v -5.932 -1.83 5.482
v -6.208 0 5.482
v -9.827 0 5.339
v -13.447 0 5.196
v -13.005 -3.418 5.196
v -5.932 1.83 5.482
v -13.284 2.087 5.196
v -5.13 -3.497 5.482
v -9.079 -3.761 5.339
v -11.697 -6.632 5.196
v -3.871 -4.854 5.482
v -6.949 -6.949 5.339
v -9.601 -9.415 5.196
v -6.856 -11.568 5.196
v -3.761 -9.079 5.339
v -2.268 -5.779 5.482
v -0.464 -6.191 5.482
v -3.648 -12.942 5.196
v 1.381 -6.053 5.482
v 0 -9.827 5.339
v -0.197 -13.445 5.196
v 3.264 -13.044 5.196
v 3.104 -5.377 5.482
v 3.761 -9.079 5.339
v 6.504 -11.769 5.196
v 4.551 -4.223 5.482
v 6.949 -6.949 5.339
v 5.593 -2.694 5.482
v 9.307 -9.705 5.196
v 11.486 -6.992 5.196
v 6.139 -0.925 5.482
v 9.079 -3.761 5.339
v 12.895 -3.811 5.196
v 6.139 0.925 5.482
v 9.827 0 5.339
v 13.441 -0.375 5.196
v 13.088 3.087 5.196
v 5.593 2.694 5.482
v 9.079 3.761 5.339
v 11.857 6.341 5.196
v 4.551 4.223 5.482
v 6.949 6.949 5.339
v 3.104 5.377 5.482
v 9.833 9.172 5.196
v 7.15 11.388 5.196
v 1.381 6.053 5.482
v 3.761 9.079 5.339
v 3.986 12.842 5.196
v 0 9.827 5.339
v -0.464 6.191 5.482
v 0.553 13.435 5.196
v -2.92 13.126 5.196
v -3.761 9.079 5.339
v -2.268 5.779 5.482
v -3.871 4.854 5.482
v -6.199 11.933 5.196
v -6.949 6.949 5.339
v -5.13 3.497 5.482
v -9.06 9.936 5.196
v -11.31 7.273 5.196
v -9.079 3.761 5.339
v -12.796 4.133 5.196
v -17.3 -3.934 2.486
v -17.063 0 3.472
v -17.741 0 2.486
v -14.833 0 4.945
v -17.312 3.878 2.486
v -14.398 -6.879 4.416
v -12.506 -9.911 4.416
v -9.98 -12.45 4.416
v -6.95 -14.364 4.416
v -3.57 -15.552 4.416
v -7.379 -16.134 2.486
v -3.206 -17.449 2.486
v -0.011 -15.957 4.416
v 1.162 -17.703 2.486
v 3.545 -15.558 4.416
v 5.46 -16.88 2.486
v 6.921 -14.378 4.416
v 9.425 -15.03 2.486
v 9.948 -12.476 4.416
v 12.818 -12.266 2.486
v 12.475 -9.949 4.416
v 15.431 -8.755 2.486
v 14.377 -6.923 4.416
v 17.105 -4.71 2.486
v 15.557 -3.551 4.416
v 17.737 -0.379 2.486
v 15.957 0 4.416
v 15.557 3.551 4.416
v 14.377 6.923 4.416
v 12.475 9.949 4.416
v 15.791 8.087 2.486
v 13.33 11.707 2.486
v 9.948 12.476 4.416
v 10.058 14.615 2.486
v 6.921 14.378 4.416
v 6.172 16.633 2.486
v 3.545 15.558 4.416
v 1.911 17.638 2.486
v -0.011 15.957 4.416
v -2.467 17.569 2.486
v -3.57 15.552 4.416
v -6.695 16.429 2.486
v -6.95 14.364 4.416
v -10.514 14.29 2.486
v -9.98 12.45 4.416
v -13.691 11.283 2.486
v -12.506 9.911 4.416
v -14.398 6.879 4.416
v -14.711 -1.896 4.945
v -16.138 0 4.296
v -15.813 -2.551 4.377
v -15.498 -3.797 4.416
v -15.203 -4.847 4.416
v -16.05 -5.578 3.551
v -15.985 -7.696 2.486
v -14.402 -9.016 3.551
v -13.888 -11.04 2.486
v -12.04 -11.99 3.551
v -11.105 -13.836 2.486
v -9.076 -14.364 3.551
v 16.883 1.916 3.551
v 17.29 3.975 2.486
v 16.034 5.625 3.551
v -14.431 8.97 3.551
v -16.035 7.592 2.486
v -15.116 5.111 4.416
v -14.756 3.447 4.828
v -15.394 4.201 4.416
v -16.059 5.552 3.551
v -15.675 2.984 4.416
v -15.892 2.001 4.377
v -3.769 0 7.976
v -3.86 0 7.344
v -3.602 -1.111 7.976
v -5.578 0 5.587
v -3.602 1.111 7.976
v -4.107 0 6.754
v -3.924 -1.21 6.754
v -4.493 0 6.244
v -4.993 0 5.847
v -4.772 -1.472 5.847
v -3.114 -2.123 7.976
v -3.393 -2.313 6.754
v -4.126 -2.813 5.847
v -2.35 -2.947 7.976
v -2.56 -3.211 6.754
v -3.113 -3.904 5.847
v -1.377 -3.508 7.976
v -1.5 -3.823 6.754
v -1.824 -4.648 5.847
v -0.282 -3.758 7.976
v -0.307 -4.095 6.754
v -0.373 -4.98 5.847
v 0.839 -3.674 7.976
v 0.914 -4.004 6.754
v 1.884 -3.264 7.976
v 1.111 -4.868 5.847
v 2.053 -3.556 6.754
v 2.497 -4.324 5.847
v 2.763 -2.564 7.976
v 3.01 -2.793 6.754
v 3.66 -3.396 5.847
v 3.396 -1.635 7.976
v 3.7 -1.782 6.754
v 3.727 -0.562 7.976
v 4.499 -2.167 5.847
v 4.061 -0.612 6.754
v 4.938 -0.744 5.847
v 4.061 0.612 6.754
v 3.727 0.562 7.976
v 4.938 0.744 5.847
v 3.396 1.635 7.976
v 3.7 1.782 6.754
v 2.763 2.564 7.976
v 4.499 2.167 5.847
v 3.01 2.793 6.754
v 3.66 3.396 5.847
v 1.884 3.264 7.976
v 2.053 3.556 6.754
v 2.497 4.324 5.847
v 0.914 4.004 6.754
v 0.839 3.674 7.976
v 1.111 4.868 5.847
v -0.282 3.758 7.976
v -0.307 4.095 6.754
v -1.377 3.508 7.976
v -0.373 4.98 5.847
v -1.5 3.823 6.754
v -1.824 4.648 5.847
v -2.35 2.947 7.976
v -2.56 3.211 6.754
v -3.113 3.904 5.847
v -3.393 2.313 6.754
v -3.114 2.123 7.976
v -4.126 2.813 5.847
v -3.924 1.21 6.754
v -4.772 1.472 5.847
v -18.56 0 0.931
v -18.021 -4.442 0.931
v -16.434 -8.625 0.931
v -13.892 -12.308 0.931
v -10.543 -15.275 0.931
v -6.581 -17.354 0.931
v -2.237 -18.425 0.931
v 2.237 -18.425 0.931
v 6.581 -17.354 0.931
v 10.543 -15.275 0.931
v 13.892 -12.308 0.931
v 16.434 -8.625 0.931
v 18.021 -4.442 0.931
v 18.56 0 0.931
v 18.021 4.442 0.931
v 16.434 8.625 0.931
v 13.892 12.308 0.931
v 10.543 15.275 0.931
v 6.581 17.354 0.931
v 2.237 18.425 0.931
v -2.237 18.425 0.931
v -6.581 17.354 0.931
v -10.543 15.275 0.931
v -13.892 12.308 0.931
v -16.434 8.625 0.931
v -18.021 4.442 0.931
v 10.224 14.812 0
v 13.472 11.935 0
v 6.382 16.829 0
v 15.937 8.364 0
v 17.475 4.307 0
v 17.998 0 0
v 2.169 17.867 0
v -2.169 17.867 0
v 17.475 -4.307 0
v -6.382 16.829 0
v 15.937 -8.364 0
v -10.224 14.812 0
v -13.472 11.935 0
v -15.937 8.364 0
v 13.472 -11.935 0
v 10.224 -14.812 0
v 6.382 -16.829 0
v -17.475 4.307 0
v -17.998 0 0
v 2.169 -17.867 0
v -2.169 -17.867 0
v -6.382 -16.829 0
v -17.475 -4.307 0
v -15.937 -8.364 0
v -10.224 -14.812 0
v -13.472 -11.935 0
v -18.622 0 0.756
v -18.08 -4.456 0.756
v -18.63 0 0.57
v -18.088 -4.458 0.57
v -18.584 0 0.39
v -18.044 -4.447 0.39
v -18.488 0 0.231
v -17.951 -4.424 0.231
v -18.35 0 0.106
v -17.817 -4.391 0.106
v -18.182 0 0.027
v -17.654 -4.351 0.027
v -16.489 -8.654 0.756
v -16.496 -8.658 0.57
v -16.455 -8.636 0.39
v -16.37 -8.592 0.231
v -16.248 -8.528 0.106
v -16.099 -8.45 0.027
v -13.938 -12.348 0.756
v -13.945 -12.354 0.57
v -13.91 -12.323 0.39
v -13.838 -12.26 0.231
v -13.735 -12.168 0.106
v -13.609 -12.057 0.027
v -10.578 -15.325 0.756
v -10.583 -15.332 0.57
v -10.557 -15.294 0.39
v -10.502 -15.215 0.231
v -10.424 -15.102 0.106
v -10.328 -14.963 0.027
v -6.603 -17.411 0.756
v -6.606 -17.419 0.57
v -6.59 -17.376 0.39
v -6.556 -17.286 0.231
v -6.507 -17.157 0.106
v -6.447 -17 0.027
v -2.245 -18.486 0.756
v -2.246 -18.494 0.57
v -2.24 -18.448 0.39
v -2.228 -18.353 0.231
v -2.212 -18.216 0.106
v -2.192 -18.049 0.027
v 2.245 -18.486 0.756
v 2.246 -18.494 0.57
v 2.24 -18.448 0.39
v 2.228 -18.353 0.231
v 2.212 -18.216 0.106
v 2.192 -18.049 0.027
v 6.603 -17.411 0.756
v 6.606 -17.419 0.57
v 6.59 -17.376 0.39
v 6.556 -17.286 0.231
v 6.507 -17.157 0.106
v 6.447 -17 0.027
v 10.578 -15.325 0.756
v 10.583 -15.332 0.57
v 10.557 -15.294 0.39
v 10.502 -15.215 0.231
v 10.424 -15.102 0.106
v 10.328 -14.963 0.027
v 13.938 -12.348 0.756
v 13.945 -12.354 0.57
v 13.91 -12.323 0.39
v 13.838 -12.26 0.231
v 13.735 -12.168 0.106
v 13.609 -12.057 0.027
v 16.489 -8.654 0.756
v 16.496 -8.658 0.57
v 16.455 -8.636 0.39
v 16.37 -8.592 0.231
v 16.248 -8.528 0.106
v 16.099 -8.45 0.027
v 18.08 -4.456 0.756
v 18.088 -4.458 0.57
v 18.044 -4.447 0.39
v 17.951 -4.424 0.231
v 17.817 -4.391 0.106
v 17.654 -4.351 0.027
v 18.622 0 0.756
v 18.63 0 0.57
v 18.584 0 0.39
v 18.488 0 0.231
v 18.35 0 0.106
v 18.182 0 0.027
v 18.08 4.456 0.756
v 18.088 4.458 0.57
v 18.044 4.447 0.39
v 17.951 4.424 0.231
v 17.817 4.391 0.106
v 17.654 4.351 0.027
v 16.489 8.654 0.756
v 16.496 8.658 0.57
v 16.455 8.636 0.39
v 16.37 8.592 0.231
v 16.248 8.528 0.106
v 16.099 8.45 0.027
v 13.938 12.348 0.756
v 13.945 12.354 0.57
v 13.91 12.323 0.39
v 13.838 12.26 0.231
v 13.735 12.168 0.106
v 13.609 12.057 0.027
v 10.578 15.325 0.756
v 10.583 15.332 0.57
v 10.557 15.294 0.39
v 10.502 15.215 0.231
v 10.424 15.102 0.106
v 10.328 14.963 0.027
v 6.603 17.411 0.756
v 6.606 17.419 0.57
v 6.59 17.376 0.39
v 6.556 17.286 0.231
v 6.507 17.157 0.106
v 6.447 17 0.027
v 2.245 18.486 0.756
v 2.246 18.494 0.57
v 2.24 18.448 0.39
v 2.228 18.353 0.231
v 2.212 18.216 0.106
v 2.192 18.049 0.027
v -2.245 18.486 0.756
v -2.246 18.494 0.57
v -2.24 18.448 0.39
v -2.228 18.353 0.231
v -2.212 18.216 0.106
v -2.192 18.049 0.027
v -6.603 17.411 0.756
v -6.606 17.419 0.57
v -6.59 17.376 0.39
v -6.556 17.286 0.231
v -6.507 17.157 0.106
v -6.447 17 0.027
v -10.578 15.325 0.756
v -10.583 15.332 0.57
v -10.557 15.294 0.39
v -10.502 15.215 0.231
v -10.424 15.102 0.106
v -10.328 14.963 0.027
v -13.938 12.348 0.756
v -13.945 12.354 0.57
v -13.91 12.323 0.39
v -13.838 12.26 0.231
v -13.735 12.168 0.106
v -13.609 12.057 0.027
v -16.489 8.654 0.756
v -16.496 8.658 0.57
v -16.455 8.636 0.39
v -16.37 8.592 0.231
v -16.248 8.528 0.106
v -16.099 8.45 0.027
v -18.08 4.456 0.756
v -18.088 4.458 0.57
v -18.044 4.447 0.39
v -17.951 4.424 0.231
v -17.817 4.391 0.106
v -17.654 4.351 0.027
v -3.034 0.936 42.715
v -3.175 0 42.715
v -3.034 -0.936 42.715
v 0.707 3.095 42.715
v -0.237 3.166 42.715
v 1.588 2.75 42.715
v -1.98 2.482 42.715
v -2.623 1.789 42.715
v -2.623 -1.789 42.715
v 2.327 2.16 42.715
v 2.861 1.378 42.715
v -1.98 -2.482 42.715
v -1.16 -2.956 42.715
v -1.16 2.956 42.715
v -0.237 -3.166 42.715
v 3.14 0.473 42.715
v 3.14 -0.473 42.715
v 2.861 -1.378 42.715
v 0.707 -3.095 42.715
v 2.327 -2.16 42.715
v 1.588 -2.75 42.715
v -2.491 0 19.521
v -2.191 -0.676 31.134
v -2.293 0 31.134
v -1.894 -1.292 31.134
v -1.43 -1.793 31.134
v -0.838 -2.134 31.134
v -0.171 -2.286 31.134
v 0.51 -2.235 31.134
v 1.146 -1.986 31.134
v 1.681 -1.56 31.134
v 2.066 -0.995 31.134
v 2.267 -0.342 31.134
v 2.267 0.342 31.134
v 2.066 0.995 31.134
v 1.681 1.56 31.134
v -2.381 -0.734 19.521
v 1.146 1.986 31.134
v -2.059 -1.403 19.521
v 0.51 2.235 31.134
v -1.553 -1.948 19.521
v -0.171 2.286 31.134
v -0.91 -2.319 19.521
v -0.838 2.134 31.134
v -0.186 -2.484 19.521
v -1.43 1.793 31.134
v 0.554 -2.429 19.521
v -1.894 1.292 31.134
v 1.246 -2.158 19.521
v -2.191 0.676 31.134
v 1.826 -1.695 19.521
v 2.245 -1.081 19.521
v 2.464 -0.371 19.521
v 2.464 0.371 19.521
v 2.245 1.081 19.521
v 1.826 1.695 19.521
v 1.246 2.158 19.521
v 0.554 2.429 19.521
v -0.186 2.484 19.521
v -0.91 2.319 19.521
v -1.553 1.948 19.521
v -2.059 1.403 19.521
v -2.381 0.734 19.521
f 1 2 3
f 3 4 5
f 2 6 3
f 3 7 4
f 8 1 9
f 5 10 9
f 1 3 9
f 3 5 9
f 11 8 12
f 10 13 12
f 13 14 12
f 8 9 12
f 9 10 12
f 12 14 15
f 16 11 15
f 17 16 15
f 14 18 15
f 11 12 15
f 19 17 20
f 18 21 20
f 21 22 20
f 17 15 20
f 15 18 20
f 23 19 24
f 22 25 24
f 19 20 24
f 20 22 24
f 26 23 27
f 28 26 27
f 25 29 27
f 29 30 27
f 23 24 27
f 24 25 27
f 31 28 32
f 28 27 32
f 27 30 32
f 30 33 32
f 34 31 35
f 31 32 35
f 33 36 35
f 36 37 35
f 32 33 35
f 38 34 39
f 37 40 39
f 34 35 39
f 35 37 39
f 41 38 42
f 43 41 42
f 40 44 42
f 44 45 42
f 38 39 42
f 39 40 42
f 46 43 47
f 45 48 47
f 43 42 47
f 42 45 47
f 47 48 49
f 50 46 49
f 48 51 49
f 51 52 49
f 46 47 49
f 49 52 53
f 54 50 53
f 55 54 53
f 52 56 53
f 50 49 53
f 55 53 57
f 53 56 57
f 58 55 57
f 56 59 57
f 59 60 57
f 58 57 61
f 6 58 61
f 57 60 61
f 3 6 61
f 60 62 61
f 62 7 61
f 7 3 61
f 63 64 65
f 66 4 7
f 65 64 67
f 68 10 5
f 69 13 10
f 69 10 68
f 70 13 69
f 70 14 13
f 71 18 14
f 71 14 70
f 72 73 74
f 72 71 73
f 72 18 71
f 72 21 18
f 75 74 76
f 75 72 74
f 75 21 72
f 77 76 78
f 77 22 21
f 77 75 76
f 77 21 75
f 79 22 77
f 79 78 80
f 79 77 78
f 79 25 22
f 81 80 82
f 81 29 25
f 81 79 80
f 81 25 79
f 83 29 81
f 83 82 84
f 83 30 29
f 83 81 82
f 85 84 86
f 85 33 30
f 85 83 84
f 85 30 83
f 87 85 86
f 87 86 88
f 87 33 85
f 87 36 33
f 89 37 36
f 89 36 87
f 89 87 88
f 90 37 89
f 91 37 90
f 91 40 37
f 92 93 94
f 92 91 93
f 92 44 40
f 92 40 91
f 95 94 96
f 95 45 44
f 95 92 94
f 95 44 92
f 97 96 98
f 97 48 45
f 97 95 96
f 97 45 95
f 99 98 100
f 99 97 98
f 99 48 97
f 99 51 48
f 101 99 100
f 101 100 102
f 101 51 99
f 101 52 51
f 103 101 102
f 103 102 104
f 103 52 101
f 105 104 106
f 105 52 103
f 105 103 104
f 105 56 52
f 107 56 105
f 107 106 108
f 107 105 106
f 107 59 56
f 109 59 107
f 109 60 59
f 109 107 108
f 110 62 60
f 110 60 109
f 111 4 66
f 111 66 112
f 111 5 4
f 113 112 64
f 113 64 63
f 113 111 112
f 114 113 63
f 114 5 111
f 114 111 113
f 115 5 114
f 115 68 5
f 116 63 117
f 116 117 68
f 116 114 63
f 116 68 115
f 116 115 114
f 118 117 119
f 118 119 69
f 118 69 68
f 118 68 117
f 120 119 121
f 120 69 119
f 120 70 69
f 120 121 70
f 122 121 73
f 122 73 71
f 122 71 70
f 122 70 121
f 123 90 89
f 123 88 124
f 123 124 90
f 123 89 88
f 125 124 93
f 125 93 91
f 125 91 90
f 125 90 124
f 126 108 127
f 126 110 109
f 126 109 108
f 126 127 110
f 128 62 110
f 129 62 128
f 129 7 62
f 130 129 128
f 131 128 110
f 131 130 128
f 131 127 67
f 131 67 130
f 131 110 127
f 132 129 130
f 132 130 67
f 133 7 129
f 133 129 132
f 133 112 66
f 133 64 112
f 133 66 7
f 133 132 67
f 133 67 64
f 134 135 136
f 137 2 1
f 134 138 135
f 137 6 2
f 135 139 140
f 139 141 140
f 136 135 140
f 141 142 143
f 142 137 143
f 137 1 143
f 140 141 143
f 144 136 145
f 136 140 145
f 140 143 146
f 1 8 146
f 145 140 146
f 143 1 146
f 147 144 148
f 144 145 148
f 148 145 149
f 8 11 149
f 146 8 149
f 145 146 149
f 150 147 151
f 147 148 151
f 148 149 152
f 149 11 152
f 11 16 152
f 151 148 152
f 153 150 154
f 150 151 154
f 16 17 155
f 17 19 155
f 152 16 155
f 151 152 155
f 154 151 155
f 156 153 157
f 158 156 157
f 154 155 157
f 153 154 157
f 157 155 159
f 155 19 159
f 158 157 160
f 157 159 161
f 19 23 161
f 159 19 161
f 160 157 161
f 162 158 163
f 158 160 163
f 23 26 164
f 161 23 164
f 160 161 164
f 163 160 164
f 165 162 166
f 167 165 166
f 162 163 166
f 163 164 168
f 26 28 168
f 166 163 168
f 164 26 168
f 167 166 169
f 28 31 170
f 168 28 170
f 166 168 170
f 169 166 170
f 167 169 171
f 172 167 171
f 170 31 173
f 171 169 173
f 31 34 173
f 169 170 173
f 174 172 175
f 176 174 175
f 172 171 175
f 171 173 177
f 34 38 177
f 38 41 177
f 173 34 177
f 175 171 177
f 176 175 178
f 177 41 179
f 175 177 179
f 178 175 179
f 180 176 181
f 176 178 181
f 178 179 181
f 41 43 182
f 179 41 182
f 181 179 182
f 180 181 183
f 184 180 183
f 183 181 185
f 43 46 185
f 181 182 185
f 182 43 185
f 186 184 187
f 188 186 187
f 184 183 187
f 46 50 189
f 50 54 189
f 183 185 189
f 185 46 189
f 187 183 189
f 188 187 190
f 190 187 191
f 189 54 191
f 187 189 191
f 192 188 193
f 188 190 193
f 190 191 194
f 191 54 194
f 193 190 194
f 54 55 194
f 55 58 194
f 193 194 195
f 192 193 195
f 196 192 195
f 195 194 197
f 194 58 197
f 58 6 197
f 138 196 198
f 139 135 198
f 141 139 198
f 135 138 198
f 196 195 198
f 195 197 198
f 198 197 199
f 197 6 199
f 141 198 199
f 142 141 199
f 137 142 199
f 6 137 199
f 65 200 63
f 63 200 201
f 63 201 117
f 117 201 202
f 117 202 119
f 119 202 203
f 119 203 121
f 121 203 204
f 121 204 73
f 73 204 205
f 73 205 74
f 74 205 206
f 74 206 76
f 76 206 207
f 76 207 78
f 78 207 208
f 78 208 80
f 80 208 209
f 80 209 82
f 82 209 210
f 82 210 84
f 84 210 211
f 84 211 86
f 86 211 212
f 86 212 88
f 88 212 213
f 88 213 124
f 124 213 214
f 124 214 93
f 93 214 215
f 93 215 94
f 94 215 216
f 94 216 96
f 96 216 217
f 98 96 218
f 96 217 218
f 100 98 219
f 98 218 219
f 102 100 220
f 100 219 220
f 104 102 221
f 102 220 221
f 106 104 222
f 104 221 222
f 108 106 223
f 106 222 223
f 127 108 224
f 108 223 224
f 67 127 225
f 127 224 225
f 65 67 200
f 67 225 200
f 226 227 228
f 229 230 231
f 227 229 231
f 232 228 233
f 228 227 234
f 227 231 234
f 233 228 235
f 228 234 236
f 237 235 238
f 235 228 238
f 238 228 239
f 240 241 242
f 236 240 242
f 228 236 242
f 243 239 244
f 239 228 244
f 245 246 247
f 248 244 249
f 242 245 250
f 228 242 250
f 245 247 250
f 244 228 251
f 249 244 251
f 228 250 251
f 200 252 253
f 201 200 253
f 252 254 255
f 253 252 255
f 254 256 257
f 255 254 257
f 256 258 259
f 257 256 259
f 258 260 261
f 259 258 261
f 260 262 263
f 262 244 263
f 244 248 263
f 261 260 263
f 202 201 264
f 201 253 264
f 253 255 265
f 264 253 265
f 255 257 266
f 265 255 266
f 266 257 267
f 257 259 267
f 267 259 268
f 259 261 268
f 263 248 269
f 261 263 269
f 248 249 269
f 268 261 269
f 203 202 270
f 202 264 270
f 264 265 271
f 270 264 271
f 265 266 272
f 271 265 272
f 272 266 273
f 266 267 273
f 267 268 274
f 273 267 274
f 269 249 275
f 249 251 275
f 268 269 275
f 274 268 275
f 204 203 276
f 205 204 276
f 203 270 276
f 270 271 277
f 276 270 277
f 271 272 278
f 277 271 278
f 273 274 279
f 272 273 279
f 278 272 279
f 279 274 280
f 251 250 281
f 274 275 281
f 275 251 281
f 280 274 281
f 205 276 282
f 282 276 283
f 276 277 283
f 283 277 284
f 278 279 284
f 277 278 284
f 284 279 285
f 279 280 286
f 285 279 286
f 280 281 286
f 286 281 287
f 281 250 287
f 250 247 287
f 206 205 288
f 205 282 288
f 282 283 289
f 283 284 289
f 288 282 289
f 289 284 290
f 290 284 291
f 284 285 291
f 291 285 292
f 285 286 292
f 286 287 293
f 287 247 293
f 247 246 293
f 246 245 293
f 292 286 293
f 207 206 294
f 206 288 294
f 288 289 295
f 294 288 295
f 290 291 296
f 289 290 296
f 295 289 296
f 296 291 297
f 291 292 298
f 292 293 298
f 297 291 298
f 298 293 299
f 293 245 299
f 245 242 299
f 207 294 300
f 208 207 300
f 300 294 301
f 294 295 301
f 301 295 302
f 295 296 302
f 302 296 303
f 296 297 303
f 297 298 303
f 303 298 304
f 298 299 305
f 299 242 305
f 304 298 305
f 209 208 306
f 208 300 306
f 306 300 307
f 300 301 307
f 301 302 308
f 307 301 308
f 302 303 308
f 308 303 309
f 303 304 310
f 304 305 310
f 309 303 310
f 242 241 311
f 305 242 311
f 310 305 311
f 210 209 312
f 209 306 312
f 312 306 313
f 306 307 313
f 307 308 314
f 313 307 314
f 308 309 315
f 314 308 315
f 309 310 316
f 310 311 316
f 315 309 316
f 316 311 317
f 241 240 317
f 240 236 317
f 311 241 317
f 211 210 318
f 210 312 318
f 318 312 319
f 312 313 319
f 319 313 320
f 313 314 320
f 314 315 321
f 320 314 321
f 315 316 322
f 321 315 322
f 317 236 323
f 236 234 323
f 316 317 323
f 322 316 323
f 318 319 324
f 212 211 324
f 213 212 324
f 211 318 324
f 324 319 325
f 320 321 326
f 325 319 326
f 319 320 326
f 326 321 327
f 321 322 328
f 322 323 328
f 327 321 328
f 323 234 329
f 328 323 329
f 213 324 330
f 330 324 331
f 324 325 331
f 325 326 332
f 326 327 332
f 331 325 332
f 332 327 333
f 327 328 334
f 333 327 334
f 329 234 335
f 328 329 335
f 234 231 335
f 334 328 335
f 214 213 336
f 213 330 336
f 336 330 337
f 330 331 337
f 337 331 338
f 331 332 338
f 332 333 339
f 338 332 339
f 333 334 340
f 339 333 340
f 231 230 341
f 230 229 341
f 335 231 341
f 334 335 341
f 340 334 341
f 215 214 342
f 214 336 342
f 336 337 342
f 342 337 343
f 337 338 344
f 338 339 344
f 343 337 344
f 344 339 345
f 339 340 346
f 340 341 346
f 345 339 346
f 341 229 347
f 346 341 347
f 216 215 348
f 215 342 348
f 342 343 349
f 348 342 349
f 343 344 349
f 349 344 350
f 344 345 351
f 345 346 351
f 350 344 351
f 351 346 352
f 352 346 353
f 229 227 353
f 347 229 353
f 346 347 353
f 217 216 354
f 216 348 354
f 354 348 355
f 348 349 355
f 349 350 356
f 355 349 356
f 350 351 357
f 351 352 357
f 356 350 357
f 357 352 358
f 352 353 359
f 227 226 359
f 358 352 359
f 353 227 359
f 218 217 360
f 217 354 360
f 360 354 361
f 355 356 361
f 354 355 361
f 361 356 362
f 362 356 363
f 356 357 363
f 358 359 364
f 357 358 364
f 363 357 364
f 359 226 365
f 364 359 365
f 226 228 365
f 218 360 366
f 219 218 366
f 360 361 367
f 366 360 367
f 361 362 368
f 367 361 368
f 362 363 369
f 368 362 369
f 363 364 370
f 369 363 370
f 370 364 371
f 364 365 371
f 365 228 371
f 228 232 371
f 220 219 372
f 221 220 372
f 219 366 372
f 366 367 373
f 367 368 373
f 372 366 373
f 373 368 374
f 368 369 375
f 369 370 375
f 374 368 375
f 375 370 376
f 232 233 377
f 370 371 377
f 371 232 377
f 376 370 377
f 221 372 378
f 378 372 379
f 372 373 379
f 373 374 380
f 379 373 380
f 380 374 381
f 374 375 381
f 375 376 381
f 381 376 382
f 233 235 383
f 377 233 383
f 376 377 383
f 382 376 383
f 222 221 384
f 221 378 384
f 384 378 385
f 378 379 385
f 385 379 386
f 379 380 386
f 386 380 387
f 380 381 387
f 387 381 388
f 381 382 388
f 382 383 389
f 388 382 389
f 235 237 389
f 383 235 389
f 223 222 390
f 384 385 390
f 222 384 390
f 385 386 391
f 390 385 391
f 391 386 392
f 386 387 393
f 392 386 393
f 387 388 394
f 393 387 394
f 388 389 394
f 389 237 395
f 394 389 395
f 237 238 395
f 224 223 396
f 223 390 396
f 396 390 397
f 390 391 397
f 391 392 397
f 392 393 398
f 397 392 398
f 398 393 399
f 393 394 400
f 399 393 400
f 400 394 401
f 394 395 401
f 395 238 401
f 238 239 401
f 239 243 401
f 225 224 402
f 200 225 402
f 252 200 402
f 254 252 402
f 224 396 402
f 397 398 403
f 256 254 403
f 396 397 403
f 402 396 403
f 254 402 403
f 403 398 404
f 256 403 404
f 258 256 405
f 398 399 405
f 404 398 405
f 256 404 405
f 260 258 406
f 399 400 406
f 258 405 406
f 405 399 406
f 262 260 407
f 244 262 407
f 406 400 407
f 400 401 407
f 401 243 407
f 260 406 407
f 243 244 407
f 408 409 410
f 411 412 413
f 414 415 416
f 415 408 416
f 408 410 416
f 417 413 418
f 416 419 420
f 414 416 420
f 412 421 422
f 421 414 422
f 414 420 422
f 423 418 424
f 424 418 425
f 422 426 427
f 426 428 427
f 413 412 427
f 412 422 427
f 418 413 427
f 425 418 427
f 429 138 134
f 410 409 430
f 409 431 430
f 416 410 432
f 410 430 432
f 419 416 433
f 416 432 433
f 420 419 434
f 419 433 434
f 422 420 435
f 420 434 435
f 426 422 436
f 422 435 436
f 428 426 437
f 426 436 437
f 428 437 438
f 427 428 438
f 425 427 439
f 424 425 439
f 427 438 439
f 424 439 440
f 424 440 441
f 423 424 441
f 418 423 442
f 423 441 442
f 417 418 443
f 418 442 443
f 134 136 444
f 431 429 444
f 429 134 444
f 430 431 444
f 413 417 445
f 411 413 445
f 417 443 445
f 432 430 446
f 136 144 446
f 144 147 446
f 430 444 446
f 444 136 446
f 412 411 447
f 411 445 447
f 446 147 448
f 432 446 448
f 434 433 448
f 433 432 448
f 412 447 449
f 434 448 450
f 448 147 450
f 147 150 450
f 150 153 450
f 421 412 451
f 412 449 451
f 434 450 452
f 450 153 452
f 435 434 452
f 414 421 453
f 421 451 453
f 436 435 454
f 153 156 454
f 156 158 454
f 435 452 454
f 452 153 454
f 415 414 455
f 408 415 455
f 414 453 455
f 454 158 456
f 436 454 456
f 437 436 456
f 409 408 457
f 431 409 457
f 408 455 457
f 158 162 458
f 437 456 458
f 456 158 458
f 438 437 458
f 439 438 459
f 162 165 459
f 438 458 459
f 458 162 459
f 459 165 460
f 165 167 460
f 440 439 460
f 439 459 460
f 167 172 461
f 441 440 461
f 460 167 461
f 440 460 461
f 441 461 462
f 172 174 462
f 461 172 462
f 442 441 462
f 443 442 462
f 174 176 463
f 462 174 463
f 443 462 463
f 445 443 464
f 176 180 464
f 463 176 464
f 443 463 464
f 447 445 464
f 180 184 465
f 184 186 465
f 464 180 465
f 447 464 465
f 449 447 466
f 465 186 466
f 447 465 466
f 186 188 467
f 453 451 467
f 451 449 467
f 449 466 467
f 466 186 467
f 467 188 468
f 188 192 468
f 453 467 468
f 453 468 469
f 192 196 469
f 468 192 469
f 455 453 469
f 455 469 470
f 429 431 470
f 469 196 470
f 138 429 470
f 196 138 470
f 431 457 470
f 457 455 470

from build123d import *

# Parameters (mm, degrees)
F2_R = 5.08
F3_R = 0.635


with BuildPart() as f1:
    # F0 (on Front) → F1 (revolve)
    with BuildSketch(Plane.XZ):
        with BuildLine():
            ThreePointArc((-3.768967, 7.97639), (-4.492542, 6.243991), (-6.208299, 5.481795))
            Line((-6.208299, 5.481795), (-16.375725, 5.08))
            Line((-16.375725, 5.08), (-19.05, 0))
            Line((-19.05, 0), (0, 0))
            Line((0, 0), (0, 42.714926))
            Line((0, 42.714926), (-3.175, 42.714926))
            ThreePointArc((-3.175, 42.714926), (-2.256928, 25.324883), (-3.768967, 7.97639))
        make_face()
    revolve(axis=Axis((0, 0, 25.4), (0, 0, 1)))

    # F2
    f2_edges = [f1.edges().sort_by_distance(p)[0] for p in [
        (16.375725, 0, 5.08),
    ]]
    fillet(f2_edges, radius=F2_R)

    # F3
    f3_edges = [f1.edges().sort_by_distance(p)[0] for p in [
        (19.05, 0, 0),
    ]]
    fillet(f3_edges, radius=F3_R)


solid = f1.part
